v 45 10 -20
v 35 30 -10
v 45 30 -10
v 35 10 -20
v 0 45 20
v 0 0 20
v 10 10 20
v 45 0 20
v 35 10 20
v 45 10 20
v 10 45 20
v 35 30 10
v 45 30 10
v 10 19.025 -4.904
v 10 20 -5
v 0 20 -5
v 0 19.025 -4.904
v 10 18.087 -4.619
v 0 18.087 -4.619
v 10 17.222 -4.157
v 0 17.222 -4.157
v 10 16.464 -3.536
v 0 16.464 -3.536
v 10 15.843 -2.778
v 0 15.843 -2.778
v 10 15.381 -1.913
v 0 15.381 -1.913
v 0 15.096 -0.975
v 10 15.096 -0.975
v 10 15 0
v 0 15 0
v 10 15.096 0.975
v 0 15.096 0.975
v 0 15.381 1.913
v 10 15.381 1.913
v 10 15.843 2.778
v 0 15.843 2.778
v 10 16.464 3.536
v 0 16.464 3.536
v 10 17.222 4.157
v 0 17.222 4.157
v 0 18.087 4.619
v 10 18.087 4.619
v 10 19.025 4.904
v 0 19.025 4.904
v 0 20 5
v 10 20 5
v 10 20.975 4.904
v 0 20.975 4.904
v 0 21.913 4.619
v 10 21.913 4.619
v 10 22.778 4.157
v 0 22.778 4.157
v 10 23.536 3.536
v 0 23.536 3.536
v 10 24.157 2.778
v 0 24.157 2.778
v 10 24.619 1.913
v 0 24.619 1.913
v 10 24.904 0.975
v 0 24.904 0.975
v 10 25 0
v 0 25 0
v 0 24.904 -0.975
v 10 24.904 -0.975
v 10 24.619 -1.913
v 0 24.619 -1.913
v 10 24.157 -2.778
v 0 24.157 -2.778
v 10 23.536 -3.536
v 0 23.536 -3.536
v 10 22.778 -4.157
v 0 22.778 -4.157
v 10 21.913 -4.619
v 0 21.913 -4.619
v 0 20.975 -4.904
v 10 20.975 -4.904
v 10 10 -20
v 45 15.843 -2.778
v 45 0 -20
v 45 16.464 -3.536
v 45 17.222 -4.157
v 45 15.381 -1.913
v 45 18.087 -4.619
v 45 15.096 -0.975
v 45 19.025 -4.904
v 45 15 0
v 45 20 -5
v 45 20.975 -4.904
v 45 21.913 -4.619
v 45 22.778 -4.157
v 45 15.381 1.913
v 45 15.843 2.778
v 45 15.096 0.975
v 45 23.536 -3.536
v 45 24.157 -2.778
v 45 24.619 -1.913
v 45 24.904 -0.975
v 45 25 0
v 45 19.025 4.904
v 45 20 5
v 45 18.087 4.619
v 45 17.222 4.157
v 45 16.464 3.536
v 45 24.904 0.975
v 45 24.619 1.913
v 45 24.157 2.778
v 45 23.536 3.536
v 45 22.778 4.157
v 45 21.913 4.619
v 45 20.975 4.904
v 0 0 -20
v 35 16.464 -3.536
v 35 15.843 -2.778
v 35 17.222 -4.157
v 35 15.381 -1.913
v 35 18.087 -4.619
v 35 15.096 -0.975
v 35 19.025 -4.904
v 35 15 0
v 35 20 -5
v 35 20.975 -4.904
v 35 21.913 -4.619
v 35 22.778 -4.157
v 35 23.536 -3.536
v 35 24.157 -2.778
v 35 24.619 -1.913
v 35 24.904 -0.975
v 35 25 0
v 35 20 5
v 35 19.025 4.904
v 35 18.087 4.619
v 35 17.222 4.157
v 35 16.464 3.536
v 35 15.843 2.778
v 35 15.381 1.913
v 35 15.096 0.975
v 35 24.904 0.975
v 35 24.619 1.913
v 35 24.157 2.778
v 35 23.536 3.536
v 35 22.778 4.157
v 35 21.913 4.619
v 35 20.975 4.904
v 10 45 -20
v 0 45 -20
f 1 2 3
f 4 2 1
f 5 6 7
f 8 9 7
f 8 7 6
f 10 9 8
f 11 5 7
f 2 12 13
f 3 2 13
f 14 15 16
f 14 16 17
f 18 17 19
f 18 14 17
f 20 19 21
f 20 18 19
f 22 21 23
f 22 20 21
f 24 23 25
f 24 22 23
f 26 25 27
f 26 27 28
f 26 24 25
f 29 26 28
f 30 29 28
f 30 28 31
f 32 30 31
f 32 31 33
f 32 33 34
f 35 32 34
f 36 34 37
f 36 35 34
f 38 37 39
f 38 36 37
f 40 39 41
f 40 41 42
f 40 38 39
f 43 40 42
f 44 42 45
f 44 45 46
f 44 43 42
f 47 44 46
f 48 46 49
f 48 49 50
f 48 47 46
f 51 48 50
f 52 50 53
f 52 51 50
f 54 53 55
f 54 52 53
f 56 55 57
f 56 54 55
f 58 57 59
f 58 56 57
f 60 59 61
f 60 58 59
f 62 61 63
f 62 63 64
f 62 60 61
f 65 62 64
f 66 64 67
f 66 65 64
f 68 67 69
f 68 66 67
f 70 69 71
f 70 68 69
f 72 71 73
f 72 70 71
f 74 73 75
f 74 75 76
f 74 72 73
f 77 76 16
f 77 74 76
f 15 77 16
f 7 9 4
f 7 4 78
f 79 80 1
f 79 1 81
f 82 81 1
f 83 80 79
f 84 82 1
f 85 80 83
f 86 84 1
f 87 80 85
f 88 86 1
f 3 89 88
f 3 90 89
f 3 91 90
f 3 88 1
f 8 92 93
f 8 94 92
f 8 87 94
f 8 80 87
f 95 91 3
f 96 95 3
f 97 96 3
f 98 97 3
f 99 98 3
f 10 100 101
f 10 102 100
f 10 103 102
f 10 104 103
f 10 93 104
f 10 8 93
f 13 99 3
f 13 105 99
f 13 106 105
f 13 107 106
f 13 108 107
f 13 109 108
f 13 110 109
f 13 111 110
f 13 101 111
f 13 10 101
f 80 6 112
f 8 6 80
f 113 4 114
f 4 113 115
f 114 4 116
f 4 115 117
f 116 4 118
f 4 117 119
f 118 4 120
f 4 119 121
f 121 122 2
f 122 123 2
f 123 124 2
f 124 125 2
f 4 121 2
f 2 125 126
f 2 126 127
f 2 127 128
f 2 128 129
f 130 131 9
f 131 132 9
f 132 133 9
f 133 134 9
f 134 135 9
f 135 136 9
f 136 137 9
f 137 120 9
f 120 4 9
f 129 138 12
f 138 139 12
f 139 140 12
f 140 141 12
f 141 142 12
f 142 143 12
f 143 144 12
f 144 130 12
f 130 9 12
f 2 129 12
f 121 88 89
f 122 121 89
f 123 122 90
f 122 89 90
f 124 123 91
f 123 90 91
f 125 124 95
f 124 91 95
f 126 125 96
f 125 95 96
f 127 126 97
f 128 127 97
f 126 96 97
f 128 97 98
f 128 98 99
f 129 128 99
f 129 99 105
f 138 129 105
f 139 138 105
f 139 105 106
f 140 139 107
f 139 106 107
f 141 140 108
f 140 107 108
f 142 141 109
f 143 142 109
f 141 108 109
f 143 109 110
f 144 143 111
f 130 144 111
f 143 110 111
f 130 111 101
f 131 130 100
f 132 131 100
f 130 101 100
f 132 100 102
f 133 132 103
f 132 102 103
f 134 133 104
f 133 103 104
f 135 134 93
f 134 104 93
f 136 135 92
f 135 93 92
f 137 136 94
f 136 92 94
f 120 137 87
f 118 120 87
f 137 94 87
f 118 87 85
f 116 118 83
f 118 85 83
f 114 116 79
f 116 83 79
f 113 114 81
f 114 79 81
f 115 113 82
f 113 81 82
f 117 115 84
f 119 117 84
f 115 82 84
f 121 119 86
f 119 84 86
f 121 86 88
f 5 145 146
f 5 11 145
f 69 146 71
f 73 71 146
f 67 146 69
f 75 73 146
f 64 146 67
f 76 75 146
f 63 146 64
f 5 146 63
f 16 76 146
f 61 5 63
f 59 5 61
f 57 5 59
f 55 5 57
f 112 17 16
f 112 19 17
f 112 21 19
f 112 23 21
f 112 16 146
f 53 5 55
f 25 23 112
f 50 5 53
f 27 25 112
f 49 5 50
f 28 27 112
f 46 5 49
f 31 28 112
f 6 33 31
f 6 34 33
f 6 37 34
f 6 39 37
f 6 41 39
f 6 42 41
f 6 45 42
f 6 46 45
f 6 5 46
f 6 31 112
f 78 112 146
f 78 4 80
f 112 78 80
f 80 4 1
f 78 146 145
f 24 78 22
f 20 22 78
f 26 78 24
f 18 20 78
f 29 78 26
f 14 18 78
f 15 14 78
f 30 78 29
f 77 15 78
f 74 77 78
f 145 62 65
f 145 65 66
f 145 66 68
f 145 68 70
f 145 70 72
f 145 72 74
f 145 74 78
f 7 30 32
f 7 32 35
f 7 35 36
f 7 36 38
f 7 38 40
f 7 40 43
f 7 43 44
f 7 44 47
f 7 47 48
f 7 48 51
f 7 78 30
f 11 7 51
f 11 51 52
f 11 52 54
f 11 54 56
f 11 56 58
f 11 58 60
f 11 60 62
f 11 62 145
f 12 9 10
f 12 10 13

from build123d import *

# Parameters (mm, degrees)
EXTRUDE_1_DEPTH          = 20
SKETCH_1_3_W             = 10
SKETCH_1_3_H             = 20
EXTRUDE_2_DEPTH          = 20
SKETCH_2_R               = 5
CUT_EXTRUDE_1_DEPTH      = 10
CUT_EXTRUDE_2_DEPTH      = 67.708320321
CUT_EXTRUDE_2_DEPTH_BACK = 10
CUT_EXTRUDE_3_DEPTH      = 67.708320321
CUT_EXTRUDE_3_DEPTH_BACK = 10
CUT_EXTRUDE_START        = -10
SKETCH_9_R               = 5
CUT_EXTRUDE_4_DEPTH      = 10


with BuildPart() as part:
    # 스케치1 → 보스-돌출1 (new, symmetric)
    with BuildSketch(Plane.XY):
        Polygon((0, 45), (0, 0), (45, 0), (45, 10), (35, 10), (10, 10), (10, 45), align=None)
    extrude(amount=EXTRUDE_1_DEPTH, both=True)

    # 스케치1<3> → 보스-돌출2 (add, symmetric)
    with BuildSketch(Plane.XY):
        with Locations((40, 20)):
            Rectangle(SKETCH_1_3_W, SKETCH_1_3_H)
    extrude(amount=EXTRUDE_2_DEPTH, both=True)

    # 스케치2 → 컷-돌출1 (cut)
    with BuildSketch(Plane(origin=(45, 0, 0), x_dir=(0, 0, -1), z_dir=(1, 0, 0))):
        with Locations((0, 20)):
            Circle(SKETCH_2_R)
    extrude(amount=-CUT_EXTRUDE_1_DEPTH, mode=Mode.SUBTRACT)

    # 스케치2<5> → 컷-돌출2 (cut, two sides: drawn at the far end of the back side and taken through both)
    with BuildSketch(Plane(origin=(45, 0, 0), x_dir=(0, 0, -1), z_dir=(1, 0, 0)).offset(-CUT_EXTRUDE_2_DEPTH_BACK)):
        Polygon((-20, 10), (-10, 30), (-20, 30), align=None)
    extrude(amount=CUT_EXTRUDE_2_DEPTH + CUT_EXTRUDE_2_DEPTH_BACK, mode=Mode.SUBTRACT)

    # 스케치7 → 컷-돌출3 (cut, two sides: drawn at the far end of the back side and taken through both)
    with BuildSketch(Plane(origin=(45, 0, 0), x_dir=(0, 0, -1), z_dir=(1, 0, 0)).offset(-CUT_EXTRUDE_3_DEPTH_BACK)):
        Polygon((20, 30), (10, 30), (20, 10), align=None)
    extrude(amount=CUT_EXTRUDE_3_DEPTH + CUT_EXTRUDE_3_DEPTH_BACK, mode=Mode.SUBTRACT)

    # 스케치9 → 컷-돌출4 (cut)
    with BuildSketch(Plane.ZY.offset(CUT_EXTRUDE_START)):
        with Locations((0, 20)):
            Circle(SKETCH_9_R)
    extrude(amount=CUT_EXTRUDE_4_DEPTH, mode=Mode.SUBTRACT)


solid = part.part
